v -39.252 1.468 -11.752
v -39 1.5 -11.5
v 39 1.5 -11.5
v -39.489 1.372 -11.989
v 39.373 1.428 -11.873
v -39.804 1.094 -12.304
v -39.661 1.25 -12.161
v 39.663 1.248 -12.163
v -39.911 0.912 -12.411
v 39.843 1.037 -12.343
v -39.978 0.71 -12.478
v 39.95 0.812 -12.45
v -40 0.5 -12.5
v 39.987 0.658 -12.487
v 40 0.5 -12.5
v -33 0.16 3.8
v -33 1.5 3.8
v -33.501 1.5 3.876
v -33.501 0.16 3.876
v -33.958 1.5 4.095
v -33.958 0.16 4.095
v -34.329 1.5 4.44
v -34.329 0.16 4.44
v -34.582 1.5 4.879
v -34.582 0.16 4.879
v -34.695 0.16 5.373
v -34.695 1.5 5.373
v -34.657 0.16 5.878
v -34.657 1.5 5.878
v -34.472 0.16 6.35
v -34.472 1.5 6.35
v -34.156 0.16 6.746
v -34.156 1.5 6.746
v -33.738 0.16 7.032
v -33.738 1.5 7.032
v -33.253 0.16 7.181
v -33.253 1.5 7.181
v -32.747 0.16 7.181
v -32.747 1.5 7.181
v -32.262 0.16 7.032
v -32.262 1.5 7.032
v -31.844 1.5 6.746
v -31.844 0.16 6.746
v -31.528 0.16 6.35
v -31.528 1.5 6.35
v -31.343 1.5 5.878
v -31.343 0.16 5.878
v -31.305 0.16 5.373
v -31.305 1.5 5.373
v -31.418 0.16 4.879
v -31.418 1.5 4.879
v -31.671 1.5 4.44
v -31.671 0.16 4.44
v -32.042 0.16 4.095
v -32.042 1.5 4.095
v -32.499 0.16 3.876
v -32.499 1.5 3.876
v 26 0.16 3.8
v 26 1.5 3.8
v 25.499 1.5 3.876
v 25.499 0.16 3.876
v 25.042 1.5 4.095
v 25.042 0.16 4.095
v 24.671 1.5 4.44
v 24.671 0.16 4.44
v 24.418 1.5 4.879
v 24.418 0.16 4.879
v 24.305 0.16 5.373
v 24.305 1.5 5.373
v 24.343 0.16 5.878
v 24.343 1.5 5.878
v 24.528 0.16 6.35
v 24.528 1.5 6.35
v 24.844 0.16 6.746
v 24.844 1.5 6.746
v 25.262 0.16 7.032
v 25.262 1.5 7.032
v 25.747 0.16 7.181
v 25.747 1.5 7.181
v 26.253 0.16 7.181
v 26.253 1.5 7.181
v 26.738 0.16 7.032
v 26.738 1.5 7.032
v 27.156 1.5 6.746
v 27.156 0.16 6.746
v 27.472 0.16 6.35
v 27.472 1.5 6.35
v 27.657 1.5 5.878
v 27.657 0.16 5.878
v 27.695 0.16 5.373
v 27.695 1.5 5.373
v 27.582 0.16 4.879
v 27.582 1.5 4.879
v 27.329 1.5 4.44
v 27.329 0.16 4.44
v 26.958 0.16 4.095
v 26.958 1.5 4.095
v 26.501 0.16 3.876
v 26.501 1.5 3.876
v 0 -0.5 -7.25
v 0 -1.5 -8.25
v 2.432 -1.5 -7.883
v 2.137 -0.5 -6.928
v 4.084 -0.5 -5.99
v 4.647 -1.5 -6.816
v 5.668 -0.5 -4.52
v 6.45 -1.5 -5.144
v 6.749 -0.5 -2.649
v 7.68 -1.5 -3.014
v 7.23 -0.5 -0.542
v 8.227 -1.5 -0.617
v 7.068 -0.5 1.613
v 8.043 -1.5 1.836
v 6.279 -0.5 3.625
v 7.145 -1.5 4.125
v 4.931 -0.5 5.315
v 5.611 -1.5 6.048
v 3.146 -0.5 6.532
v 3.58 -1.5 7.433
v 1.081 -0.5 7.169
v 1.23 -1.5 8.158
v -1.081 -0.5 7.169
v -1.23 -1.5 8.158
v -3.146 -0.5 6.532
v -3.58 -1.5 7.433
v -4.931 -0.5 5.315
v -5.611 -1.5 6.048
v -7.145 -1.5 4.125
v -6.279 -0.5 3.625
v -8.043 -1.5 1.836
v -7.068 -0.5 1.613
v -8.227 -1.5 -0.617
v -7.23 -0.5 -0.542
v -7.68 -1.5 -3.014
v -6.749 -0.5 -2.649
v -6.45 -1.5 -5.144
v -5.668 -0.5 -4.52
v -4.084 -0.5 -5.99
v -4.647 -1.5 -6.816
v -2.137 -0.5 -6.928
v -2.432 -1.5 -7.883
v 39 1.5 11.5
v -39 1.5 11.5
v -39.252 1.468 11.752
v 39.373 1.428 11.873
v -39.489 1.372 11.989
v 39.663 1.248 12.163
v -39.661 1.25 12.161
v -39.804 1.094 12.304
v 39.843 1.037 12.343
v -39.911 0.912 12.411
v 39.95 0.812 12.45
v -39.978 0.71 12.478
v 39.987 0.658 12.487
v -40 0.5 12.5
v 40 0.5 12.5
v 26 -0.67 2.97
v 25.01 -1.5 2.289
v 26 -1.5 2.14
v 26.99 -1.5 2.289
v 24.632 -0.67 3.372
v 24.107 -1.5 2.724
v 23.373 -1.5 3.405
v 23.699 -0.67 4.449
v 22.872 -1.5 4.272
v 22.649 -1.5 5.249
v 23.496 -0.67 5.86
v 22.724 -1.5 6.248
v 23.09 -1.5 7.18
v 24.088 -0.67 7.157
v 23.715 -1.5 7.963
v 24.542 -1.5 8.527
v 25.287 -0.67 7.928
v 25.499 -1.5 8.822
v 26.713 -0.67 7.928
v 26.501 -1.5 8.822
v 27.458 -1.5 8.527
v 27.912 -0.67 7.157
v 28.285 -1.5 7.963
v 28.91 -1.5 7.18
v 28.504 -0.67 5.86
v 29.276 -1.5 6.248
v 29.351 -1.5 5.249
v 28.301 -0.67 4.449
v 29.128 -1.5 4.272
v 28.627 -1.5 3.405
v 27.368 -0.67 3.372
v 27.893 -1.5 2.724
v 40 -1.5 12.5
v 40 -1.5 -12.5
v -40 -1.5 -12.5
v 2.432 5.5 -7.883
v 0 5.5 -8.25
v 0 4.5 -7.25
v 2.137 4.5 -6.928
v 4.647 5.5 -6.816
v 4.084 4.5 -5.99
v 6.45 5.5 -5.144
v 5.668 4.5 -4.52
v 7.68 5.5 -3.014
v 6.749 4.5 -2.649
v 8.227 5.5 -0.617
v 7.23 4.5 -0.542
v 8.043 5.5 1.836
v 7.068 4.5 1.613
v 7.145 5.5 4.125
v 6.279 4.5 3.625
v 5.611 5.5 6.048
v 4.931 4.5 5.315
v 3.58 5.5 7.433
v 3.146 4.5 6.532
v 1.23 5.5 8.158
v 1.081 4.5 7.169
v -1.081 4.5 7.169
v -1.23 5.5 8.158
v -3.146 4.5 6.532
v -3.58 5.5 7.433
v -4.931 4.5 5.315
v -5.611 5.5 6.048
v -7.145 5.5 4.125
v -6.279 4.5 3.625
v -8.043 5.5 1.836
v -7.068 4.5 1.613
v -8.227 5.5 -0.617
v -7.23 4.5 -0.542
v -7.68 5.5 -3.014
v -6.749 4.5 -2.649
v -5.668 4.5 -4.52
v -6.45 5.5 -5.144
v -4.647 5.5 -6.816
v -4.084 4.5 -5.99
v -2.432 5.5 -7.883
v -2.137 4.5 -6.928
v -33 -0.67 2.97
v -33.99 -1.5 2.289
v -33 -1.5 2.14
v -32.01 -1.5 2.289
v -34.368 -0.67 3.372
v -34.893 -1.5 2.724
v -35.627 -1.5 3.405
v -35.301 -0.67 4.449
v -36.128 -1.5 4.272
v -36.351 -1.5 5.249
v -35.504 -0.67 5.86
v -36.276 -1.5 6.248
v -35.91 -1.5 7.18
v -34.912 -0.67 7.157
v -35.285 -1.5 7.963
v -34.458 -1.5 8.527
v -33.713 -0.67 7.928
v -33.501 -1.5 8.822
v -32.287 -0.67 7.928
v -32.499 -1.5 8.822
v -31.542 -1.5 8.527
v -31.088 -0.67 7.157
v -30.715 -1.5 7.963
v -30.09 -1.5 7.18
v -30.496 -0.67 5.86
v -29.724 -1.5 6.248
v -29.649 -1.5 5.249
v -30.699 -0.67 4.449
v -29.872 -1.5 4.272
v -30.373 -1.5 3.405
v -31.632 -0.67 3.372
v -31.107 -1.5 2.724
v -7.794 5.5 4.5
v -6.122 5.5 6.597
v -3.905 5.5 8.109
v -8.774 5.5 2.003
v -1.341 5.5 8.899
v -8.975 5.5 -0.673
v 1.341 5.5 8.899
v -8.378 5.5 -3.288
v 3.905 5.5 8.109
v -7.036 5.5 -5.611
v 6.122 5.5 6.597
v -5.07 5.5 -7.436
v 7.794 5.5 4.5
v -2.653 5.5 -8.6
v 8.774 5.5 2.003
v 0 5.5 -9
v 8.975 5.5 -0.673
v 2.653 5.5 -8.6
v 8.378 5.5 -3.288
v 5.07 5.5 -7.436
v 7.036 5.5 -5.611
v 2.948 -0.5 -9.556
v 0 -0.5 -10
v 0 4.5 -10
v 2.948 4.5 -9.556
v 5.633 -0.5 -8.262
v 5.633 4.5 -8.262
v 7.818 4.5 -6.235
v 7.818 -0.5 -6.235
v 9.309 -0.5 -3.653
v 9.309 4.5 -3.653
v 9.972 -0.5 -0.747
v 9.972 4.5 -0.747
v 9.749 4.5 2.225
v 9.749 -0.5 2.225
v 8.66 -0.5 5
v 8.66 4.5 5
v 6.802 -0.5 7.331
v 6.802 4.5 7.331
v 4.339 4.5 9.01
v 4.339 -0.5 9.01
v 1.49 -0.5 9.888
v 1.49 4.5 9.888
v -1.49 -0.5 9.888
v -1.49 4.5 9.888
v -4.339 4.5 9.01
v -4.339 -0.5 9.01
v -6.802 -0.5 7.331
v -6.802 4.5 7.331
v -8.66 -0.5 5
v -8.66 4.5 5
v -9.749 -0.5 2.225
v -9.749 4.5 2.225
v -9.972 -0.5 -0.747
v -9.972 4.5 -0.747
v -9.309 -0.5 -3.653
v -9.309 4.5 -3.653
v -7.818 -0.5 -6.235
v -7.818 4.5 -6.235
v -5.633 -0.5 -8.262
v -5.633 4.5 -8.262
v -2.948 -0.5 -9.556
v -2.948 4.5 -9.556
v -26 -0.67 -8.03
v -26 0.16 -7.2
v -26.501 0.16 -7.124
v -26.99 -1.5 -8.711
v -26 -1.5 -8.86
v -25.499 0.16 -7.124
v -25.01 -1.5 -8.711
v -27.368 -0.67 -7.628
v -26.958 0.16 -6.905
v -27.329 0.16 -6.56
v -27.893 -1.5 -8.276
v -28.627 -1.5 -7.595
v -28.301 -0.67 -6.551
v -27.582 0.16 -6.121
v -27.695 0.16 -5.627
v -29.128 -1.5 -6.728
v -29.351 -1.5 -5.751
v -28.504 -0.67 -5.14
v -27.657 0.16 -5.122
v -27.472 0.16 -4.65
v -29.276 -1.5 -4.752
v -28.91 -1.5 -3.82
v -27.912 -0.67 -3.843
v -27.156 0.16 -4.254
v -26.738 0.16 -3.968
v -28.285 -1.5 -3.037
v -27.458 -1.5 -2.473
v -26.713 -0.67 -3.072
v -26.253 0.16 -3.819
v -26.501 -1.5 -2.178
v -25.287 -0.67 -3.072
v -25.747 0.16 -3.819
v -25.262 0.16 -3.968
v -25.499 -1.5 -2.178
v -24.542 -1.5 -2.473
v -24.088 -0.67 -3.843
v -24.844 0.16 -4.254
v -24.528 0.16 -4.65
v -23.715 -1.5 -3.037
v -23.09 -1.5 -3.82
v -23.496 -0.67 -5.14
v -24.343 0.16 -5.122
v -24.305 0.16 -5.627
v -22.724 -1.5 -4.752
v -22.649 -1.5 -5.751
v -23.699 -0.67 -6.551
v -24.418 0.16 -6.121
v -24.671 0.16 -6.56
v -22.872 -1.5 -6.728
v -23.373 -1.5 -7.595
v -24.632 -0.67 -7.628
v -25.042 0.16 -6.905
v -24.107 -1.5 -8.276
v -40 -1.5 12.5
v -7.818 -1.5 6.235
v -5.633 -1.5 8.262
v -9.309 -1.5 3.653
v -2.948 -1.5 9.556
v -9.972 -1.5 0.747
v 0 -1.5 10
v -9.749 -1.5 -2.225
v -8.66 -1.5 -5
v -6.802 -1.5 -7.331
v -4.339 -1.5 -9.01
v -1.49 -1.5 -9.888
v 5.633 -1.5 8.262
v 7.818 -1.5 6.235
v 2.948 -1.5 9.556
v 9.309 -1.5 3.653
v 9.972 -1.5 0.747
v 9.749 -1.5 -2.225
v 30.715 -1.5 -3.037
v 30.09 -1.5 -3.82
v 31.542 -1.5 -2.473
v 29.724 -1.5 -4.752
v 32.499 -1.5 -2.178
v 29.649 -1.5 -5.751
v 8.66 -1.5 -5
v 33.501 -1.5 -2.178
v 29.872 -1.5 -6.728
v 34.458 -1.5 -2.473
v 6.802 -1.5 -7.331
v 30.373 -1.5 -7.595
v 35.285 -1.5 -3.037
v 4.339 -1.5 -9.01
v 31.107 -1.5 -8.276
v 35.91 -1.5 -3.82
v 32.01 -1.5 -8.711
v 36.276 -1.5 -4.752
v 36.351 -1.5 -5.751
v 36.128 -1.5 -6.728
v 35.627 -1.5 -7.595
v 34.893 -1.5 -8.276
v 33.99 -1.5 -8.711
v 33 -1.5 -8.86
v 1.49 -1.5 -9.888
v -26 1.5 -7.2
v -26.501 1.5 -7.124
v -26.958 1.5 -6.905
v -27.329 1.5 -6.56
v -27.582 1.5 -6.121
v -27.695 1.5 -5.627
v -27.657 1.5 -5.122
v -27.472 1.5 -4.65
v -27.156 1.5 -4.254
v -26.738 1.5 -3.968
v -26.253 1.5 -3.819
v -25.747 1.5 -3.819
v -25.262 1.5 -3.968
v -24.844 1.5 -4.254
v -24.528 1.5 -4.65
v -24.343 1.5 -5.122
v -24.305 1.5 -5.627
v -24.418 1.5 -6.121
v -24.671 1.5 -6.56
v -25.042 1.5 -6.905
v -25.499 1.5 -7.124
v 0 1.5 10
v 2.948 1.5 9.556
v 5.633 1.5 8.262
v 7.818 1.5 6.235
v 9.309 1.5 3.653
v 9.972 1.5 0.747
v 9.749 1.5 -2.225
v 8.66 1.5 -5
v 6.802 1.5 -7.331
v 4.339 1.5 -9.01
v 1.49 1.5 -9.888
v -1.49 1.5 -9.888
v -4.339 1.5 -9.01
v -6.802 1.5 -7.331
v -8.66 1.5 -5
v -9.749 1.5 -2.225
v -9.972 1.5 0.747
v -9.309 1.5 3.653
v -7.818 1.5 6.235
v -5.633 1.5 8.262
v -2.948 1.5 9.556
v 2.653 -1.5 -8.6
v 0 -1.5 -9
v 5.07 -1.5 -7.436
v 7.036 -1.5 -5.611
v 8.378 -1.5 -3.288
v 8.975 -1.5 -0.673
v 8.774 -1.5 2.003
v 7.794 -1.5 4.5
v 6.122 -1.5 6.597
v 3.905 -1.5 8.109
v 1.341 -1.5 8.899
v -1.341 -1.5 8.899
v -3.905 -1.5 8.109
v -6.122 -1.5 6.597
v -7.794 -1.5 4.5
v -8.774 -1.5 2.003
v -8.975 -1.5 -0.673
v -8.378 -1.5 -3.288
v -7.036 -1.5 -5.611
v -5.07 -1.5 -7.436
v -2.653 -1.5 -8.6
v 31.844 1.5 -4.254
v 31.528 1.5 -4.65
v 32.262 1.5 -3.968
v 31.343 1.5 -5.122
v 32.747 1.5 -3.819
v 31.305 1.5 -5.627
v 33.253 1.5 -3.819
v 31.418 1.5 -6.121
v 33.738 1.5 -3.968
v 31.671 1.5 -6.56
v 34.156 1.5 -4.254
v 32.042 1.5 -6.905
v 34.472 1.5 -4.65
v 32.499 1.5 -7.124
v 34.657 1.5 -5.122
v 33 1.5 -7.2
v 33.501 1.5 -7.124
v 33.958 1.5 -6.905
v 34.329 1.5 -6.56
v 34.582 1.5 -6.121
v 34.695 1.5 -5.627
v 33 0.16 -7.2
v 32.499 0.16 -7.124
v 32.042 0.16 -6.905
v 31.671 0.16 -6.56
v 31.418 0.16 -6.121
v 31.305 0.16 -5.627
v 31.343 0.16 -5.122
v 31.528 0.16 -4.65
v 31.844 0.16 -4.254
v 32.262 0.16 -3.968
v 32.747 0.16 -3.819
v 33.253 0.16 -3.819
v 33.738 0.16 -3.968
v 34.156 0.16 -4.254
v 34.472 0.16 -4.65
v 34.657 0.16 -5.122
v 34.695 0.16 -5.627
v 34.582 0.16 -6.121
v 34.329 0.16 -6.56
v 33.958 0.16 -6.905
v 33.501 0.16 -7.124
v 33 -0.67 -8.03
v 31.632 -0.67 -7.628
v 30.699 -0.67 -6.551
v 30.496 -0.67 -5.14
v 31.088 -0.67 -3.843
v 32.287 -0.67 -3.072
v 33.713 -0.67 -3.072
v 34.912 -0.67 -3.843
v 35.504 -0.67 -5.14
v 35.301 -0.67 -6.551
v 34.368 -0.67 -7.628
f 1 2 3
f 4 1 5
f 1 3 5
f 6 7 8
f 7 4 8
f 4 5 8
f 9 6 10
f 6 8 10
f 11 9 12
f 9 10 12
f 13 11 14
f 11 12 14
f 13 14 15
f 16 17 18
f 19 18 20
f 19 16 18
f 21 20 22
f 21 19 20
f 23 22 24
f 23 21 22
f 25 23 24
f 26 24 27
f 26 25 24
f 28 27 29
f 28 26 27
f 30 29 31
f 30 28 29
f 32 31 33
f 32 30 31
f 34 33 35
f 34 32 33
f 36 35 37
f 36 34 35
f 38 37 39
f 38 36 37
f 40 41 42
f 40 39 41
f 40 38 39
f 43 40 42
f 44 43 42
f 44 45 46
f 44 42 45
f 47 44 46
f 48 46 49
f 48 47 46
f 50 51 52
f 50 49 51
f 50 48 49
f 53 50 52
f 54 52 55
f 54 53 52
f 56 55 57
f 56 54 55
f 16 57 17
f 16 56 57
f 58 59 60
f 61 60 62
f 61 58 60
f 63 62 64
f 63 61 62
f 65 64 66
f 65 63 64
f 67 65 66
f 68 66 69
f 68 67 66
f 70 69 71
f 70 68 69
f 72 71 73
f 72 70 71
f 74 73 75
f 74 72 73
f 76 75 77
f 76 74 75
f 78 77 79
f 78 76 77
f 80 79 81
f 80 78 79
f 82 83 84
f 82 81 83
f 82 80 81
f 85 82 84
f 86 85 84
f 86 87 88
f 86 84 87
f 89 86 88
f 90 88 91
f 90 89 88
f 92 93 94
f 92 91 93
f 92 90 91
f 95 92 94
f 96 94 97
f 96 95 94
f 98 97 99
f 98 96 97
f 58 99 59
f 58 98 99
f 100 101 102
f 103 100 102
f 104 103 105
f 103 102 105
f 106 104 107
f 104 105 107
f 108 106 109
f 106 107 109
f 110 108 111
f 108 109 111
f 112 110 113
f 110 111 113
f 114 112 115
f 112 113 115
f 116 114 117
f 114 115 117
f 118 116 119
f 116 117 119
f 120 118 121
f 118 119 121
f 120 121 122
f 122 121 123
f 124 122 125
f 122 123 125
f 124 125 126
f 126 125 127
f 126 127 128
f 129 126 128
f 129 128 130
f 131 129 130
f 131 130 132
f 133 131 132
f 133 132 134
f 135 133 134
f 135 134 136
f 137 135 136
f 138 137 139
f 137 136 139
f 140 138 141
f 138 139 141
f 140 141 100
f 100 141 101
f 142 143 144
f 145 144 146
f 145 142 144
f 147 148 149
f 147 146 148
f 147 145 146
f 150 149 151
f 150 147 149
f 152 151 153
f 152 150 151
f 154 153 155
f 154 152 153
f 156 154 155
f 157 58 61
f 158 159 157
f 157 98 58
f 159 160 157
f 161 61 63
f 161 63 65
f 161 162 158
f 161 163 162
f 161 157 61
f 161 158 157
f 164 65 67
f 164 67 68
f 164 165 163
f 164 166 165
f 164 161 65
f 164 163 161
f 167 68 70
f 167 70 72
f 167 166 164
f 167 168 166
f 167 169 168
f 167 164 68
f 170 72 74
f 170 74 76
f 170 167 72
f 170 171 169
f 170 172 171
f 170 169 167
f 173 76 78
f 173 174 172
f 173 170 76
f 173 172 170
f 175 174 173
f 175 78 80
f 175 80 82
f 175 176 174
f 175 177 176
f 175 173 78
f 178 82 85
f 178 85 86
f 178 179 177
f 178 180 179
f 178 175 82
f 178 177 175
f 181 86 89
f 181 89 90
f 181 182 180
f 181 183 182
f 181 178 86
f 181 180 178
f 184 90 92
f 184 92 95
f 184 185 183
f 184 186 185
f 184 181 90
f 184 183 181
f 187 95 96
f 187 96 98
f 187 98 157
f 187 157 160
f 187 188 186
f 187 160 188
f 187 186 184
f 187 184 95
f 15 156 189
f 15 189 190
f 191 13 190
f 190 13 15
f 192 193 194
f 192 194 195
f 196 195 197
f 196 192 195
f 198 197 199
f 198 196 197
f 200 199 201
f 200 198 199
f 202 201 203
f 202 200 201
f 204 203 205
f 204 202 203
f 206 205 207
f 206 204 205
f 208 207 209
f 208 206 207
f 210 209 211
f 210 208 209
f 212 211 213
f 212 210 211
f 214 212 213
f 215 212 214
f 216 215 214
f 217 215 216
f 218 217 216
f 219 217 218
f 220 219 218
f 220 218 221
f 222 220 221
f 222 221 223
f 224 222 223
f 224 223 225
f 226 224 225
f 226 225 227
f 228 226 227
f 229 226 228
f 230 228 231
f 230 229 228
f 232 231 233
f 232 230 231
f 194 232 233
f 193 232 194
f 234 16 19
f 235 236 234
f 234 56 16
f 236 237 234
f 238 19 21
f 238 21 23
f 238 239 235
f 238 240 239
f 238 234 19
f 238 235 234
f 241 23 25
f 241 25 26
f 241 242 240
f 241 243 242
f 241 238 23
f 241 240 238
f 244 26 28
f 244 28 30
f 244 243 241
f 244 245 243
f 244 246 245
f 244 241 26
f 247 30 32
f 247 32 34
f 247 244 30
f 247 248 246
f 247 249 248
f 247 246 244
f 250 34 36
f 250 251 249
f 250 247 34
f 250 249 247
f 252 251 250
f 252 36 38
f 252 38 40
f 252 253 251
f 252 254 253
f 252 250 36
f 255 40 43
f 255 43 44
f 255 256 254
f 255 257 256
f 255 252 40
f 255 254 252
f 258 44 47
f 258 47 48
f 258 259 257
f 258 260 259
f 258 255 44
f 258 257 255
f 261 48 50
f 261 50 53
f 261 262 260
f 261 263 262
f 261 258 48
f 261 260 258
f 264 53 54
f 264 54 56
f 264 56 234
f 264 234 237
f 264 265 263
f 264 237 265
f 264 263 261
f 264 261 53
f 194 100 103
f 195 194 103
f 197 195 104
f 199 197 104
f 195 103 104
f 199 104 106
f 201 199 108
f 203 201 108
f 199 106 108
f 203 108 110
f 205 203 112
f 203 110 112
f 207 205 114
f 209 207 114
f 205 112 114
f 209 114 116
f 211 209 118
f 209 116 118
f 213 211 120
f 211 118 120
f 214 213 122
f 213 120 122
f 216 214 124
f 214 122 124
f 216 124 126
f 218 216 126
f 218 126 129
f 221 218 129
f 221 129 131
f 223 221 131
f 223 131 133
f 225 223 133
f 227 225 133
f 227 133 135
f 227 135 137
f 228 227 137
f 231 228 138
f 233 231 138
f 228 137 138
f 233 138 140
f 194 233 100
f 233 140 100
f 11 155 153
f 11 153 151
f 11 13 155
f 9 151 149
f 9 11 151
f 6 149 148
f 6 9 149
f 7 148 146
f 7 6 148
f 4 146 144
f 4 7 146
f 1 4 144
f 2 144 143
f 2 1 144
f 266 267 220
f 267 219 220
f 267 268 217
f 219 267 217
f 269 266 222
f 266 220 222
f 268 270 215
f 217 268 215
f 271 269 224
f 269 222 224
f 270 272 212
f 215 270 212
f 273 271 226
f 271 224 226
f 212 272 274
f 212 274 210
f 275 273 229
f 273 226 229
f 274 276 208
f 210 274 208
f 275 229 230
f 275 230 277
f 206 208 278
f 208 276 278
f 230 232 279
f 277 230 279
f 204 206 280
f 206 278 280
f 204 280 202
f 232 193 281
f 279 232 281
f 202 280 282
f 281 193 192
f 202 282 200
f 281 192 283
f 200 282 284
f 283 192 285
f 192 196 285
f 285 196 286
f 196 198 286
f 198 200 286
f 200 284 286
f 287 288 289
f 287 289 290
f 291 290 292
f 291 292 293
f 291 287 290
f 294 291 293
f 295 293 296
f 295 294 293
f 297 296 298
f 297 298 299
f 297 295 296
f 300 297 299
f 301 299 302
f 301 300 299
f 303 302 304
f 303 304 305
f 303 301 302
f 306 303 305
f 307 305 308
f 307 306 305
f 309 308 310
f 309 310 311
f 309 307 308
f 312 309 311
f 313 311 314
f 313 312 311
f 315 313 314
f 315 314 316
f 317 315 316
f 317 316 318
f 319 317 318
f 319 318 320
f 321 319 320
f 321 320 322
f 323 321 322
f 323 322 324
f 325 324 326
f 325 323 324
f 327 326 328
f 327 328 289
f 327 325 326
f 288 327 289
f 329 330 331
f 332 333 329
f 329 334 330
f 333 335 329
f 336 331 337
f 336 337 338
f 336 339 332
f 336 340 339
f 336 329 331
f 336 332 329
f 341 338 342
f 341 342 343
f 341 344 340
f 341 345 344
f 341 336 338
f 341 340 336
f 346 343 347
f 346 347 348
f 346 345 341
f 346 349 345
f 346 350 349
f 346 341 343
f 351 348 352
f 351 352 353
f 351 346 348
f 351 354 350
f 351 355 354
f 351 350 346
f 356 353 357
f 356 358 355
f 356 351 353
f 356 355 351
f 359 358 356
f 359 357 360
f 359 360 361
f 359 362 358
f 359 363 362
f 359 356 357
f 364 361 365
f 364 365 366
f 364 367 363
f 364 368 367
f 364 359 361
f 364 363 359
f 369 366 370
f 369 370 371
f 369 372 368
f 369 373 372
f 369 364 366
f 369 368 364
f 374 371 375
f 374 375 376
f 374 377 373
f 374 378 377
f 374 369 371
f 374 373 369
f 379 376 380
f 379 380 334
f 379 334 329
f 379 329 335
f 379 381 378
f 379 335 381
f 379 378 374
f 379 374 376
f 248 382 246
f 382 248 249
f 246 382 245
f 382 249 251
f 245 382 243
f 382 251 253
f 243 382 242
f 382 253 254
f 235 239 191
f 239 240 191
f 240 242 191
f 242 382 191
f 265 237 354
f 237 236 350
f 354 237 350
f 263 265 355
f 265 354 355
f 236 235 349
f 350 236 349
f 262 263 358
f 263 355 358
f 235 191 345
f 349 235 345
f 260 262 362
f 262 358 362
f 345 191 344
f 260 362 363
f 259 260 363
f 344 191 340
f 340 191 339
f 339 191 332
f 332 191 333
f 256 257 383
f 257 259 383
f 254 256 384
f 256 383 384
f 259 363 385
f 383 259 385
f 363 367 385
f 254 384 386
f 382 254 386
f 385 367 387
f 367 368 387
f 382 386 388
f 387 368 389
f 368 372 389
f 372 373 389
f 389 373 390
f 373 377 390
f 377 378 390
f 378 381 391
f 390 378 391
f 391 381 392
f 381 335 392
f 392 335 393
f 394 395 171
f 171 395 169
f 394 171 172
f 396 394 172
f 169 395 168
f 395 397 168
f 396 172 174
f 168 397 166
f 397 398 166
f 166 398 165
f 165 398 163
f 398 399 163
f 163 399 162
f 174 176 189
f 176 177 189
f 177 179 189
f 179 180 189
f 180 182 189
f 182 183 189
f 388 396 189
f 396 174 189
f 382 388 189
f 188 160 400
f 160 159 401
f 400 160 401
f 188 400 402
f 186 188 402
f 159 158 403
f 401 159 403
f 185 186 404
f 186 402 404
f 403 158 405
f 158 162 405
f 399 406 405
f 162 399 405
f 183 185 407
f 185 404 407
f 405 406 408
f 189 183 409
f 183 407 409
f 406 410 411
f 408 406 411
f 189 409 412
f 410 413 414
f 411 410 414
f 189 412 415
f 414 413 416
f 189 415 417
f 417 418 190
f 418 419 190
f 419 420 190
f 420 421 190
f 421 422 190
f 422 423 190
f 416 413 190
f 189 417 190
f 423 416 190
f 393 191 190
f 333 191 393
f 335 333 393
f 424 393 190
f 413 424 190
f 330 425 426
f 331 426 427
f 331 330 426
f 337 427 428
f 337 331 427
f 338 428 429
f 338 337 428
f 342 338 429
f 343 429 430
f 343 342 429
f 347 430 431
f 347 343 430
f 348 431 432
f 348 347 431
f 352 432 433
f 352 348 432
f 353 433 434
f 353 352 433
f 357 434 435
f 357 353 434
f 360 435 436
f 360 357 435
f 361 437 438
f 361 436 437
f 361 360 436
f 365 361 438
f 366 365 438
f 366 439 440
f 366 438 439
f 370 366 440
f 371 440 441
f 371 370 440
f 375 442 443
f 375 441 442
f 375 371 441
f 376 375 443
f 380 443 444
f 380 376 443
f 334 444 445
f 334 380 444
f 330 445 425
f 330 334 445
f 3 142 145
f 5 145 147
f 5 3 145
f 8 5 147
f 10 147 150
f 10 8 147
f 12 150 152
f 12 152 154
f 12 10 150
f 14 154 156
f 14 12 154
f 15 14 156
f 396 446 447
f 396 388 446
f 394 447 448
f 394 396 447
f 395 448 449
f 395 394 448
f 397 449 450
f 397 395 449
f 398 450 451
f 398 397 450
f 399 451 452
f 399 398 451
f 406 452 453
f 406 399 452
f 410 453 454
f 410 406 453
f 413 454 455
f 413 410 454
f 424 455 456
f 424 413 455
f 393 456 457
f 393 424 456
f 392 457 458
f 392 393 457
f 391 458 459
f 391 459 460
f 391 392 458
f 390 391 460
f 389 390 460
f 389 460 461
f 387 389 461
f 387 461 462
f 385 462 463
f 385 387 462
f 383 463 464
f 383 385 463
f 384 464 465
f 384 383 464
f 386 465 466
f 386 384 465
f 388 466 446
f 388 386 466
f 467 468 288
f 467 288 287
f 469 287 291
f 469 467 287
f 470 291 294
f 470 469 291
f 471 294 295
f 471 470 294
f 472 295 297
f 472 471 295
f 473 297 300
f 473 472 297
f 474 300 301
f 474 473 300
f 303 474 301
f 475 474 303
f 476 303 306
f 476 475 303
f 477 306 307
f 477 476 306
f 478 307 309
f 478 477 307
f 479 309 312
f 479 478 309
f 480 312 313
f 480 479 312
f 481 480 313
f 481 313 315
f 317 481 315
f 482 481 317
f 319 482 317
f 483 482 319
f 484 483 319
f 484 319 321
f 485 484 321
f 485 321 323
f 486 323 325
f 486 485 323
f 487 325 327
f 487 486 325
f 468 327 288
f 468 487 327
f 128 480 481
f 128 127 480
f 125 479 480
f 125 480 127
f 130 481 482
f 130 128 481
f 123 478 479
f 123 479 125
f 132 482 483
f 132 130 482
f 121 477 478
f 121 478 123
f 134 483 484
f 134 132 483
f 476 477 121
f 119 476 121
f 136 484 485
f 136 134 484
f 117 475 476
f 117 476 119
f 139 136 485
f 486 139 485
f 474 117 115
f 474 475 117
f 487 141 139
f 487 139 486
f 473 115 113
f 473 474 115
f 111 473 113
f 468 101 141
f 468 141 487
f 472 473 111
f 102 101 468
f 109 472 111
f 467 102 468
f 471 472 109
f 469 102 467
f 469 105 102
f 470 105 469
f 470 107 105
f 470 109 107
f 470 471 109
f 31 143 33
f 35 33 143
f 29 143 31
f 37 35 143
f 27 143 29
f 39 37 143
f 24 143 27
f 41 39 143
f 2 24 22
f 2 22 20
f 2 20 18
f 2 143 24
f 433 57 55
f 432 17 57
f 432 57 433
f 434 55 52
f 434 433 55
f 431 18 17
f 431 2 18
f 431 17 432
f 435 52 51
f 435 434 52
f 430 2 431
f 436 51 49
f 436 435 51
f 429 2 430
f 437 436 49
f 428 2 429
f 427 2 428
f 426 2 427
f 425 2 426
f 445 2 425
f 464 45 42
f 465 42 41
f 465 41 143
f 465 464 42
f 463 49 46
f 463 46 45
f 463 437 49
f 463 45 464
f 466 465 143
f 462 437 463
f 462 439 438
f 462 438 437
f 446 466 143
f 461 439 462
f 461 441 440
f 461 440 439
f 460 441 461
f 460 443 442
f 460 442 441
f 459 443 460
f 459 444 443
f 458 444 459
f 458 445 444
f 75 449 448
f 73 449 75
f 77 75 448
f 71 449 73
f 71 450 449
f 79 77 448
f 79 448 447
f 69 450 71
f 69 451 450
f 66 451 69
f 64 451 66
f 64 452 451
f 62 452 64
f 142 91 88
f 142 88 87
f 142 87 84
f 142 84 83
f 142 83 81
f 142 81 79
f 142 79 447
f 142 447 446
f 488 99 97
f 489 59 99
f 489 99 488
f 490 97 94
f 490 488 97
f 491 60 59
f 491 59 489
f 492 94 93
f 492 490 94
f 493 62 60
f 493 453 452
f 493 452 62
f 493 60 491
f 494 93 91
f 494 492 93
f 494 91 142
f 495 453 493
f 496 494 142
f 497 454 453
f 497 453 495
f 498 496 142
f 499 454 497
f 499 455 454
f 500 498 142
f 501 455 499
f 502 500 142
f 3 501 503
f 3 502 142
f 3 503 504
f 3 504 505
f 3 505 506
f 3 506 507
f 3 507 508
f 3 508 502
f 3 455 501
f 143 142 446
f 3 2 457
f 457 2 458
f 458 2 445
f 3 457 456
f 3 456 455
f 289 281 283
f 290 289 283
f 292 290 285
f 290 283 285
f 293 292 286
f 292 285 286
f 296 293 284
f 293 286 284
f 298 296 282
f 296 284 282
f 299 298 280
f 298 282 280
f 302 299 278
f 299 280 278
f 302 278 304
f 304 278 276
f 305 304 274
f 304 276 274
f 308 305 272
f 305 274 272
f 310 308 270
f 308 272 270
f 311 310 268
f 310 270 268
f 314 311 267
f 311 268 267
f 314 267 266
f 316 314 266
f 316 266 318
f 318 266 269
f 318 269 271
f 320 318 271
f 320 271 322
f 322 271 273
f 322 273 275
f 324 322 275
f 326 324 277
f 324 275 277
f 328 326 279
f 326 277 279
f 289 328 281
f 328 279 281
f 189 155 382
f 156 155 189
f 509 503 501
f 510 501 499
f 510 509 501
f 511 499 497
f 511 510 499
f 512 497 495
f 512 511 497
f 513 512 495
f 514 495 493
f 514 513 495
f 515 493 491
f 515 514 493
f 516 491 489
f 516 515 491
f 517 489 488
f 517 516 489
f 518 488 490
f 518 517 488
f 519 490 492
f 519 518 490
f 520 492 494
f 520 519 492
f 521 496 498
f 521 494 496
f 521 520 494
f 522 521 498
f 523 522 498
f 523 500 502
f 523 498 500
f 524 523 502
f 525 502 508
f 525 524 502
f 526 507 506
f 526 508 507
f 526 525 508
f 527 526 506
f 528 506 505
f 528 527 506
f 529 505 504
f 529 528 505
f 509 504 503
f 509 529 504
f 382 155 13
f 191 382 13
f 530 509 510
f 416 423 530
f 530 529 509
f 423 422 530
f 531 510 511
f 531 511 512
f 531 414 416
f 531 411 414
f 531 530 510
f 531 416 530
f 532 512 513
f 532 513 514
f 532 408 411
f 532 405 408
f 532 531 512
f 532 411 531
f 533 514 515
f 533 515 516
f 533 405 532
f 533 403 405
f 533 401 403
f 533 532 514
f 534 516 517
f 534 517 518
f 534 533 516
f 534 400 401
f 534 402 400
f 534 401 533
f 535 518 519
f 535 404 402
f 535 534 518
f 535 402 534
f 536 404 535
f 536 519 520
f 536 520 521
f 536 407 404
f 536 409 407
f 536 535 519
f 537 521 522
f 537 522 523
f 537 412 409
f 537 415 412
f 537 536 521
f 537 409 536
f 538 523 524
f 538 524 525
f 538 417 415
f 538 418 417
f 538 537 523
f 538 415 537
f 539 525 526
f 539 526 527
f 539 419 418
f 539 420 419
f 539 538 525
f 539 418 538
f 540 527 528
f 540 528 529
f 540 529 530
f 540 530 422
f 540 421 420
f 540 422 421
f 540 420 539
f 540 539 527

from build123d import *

# Parameters (mm, degrees)
ESBO_O1_W                           = 80
ESBO_O1_H                           = 25
ESBO_O1_R                           = 10
RESSALTO_EXTRUS_O1_DEPTH            = 1.5
ESBO_O2_R                           = 10
ESBO_O2_R_2                         = 7.25
RESSALTO_EXTRUS_O2_DEPTH            = 7
CHANFRO1_SIZE                       = 1
FILETE1_R                           = 1
ESCAREADO_PARA_SFHCS_M31_AT_2_COUNT = 2
ESCAREADO_PARA_SFHCS_M31_AT_2_PITCH = 13.03840481
ESCAREADO_PARA_SFHCS_M31_AT_3_COUNT = 2
ESCAREADO_PARA_SFHCS_M31_AT_3_PITCH = 59
ESCAREADO_PARA_SFHCS_M31_AT_4_COUNT = 2
ESCAREADO_PARA_SFHCS_M31_AT_4_PITCH = 66.910387833


with BuildPart() as part:
    # Esboço1 → Ressalto-extrusão1 (new, symmetric)
    with BuildSketch(Plane(origin=(0, 0, 0), x_dir=(1, 0, 0), z_dir=(0, 1, 0))):
        Rectangle(ESBO_O1_W, ESBO_O1_H)
        with Locations(Location((0, 0, 0), (0, 0, 270))):
            Circle(ESBO_O1_R, mode=Mode.SUBTRACT)
    extrude(amount=RESSALTO_EXTRUS_O1_DEPTH, both=True)

    # Filete1
    filete1_edges = [part.edges().sort_by_distance(p)[0] for p in [
        (-40, 1.5, 0),
        (0, 1.5, 12.5),
        (40, 1.5, 0),
        (0, 1.5, -12.5),
    ]]
    fillet(filete1_edges, radius=FILETE1_R)

    # Esboço5 → Escareado para SFHCS M31 (revolve, cut)
    with BuildSketch(Plane(origin=(33, -1.5, -5.5), x_dir=(0, 0, -1), z_dir=(1, 0, 0))):
        Polygon((0, 0), (0, 7), (1.7, 7), (1.7, 1.66), (3.36, 0), align=None)
    escareado_para_sfhcs_m31 = revolve(axis=Axis((33, -7.85, -5.5), (0, 1, 0)), mode=Mode.SUBTRACT)

    # Escareado para SFHCS M31 at 2: Escareado para SFHCS M31 ×2
    with Locations(*[Vector(-0.53687549219316, 0, 0.843661487732107) * (i * ESCAREADO_PARA_SFHCS_M31_AT_2_PITCH) for i in range(1, ESCAREADO_PARA_SFHCS_M31_AT_2_COUNT)]):
        add(escareado_para_sfhcs_m31, mode=Mode.SUBTRACT)

    # Escareado para SFHCS M31 at 3: Escareado para SFHCS M31 ×2
    with Locations(*[(-i * ESCAREADO_PARA_SFHCS_M31_AT_3_PITCH, 0, 0) for i in range(1, ESCAREADO_PARA_SFHCS_M31_AT_3_COUNT)]):
        add(escareado_para_sfhcs_m31, mode=Mode.SUBTRACT)

    # Escareado para SFHCS M31 at 4: Escareado para SFHCS M31 ×2
    with Locations(*[Vector(-0.9863939238321439, 0, 0.16439898730535696) * (i * ESCAREADO_PARA_SFHCS_M31_AT_4_PITCH) for i in range(1, ESCAREADO_PARA_SFHCS_M31_AT_4_COUNT)]):
        add(escareado_para_sfhcs_m31, mode=Mode.SUBTRACT)


with BuildPart() as body_2:
    # Esboço2 → Ressalto-extrusão2 (new body)
    with BuildSketch(Plane.XZ.offset(1.5)):
        with Locations(Location((0, 0, 0), (0, 0, 270))):
            Circle(ESBO_O2_R)
        with Locations(Location((0, 0, 0), (0, 0, 270))):
            Circle(ESBO_O2_R_2, mode=Mode.SUBTRACT)
    extrude(amount=-RESSALTO_EXTRUS_O2_DEPTH)

    # Chanfro1
    chanfro1_edges = [body_2.edges().sort_by_distance(p)[0] for p in [
        (0, -1.5, 10),
        (0, -1.5, 7.25),
        (0, 5.5, 10),
        (0, 5.5, 7.25),
    ]]
    chamfer(chanfro1_edges, length=CHANFRO1_SIZE)


solid = Compound([part.part, body_2.part])
